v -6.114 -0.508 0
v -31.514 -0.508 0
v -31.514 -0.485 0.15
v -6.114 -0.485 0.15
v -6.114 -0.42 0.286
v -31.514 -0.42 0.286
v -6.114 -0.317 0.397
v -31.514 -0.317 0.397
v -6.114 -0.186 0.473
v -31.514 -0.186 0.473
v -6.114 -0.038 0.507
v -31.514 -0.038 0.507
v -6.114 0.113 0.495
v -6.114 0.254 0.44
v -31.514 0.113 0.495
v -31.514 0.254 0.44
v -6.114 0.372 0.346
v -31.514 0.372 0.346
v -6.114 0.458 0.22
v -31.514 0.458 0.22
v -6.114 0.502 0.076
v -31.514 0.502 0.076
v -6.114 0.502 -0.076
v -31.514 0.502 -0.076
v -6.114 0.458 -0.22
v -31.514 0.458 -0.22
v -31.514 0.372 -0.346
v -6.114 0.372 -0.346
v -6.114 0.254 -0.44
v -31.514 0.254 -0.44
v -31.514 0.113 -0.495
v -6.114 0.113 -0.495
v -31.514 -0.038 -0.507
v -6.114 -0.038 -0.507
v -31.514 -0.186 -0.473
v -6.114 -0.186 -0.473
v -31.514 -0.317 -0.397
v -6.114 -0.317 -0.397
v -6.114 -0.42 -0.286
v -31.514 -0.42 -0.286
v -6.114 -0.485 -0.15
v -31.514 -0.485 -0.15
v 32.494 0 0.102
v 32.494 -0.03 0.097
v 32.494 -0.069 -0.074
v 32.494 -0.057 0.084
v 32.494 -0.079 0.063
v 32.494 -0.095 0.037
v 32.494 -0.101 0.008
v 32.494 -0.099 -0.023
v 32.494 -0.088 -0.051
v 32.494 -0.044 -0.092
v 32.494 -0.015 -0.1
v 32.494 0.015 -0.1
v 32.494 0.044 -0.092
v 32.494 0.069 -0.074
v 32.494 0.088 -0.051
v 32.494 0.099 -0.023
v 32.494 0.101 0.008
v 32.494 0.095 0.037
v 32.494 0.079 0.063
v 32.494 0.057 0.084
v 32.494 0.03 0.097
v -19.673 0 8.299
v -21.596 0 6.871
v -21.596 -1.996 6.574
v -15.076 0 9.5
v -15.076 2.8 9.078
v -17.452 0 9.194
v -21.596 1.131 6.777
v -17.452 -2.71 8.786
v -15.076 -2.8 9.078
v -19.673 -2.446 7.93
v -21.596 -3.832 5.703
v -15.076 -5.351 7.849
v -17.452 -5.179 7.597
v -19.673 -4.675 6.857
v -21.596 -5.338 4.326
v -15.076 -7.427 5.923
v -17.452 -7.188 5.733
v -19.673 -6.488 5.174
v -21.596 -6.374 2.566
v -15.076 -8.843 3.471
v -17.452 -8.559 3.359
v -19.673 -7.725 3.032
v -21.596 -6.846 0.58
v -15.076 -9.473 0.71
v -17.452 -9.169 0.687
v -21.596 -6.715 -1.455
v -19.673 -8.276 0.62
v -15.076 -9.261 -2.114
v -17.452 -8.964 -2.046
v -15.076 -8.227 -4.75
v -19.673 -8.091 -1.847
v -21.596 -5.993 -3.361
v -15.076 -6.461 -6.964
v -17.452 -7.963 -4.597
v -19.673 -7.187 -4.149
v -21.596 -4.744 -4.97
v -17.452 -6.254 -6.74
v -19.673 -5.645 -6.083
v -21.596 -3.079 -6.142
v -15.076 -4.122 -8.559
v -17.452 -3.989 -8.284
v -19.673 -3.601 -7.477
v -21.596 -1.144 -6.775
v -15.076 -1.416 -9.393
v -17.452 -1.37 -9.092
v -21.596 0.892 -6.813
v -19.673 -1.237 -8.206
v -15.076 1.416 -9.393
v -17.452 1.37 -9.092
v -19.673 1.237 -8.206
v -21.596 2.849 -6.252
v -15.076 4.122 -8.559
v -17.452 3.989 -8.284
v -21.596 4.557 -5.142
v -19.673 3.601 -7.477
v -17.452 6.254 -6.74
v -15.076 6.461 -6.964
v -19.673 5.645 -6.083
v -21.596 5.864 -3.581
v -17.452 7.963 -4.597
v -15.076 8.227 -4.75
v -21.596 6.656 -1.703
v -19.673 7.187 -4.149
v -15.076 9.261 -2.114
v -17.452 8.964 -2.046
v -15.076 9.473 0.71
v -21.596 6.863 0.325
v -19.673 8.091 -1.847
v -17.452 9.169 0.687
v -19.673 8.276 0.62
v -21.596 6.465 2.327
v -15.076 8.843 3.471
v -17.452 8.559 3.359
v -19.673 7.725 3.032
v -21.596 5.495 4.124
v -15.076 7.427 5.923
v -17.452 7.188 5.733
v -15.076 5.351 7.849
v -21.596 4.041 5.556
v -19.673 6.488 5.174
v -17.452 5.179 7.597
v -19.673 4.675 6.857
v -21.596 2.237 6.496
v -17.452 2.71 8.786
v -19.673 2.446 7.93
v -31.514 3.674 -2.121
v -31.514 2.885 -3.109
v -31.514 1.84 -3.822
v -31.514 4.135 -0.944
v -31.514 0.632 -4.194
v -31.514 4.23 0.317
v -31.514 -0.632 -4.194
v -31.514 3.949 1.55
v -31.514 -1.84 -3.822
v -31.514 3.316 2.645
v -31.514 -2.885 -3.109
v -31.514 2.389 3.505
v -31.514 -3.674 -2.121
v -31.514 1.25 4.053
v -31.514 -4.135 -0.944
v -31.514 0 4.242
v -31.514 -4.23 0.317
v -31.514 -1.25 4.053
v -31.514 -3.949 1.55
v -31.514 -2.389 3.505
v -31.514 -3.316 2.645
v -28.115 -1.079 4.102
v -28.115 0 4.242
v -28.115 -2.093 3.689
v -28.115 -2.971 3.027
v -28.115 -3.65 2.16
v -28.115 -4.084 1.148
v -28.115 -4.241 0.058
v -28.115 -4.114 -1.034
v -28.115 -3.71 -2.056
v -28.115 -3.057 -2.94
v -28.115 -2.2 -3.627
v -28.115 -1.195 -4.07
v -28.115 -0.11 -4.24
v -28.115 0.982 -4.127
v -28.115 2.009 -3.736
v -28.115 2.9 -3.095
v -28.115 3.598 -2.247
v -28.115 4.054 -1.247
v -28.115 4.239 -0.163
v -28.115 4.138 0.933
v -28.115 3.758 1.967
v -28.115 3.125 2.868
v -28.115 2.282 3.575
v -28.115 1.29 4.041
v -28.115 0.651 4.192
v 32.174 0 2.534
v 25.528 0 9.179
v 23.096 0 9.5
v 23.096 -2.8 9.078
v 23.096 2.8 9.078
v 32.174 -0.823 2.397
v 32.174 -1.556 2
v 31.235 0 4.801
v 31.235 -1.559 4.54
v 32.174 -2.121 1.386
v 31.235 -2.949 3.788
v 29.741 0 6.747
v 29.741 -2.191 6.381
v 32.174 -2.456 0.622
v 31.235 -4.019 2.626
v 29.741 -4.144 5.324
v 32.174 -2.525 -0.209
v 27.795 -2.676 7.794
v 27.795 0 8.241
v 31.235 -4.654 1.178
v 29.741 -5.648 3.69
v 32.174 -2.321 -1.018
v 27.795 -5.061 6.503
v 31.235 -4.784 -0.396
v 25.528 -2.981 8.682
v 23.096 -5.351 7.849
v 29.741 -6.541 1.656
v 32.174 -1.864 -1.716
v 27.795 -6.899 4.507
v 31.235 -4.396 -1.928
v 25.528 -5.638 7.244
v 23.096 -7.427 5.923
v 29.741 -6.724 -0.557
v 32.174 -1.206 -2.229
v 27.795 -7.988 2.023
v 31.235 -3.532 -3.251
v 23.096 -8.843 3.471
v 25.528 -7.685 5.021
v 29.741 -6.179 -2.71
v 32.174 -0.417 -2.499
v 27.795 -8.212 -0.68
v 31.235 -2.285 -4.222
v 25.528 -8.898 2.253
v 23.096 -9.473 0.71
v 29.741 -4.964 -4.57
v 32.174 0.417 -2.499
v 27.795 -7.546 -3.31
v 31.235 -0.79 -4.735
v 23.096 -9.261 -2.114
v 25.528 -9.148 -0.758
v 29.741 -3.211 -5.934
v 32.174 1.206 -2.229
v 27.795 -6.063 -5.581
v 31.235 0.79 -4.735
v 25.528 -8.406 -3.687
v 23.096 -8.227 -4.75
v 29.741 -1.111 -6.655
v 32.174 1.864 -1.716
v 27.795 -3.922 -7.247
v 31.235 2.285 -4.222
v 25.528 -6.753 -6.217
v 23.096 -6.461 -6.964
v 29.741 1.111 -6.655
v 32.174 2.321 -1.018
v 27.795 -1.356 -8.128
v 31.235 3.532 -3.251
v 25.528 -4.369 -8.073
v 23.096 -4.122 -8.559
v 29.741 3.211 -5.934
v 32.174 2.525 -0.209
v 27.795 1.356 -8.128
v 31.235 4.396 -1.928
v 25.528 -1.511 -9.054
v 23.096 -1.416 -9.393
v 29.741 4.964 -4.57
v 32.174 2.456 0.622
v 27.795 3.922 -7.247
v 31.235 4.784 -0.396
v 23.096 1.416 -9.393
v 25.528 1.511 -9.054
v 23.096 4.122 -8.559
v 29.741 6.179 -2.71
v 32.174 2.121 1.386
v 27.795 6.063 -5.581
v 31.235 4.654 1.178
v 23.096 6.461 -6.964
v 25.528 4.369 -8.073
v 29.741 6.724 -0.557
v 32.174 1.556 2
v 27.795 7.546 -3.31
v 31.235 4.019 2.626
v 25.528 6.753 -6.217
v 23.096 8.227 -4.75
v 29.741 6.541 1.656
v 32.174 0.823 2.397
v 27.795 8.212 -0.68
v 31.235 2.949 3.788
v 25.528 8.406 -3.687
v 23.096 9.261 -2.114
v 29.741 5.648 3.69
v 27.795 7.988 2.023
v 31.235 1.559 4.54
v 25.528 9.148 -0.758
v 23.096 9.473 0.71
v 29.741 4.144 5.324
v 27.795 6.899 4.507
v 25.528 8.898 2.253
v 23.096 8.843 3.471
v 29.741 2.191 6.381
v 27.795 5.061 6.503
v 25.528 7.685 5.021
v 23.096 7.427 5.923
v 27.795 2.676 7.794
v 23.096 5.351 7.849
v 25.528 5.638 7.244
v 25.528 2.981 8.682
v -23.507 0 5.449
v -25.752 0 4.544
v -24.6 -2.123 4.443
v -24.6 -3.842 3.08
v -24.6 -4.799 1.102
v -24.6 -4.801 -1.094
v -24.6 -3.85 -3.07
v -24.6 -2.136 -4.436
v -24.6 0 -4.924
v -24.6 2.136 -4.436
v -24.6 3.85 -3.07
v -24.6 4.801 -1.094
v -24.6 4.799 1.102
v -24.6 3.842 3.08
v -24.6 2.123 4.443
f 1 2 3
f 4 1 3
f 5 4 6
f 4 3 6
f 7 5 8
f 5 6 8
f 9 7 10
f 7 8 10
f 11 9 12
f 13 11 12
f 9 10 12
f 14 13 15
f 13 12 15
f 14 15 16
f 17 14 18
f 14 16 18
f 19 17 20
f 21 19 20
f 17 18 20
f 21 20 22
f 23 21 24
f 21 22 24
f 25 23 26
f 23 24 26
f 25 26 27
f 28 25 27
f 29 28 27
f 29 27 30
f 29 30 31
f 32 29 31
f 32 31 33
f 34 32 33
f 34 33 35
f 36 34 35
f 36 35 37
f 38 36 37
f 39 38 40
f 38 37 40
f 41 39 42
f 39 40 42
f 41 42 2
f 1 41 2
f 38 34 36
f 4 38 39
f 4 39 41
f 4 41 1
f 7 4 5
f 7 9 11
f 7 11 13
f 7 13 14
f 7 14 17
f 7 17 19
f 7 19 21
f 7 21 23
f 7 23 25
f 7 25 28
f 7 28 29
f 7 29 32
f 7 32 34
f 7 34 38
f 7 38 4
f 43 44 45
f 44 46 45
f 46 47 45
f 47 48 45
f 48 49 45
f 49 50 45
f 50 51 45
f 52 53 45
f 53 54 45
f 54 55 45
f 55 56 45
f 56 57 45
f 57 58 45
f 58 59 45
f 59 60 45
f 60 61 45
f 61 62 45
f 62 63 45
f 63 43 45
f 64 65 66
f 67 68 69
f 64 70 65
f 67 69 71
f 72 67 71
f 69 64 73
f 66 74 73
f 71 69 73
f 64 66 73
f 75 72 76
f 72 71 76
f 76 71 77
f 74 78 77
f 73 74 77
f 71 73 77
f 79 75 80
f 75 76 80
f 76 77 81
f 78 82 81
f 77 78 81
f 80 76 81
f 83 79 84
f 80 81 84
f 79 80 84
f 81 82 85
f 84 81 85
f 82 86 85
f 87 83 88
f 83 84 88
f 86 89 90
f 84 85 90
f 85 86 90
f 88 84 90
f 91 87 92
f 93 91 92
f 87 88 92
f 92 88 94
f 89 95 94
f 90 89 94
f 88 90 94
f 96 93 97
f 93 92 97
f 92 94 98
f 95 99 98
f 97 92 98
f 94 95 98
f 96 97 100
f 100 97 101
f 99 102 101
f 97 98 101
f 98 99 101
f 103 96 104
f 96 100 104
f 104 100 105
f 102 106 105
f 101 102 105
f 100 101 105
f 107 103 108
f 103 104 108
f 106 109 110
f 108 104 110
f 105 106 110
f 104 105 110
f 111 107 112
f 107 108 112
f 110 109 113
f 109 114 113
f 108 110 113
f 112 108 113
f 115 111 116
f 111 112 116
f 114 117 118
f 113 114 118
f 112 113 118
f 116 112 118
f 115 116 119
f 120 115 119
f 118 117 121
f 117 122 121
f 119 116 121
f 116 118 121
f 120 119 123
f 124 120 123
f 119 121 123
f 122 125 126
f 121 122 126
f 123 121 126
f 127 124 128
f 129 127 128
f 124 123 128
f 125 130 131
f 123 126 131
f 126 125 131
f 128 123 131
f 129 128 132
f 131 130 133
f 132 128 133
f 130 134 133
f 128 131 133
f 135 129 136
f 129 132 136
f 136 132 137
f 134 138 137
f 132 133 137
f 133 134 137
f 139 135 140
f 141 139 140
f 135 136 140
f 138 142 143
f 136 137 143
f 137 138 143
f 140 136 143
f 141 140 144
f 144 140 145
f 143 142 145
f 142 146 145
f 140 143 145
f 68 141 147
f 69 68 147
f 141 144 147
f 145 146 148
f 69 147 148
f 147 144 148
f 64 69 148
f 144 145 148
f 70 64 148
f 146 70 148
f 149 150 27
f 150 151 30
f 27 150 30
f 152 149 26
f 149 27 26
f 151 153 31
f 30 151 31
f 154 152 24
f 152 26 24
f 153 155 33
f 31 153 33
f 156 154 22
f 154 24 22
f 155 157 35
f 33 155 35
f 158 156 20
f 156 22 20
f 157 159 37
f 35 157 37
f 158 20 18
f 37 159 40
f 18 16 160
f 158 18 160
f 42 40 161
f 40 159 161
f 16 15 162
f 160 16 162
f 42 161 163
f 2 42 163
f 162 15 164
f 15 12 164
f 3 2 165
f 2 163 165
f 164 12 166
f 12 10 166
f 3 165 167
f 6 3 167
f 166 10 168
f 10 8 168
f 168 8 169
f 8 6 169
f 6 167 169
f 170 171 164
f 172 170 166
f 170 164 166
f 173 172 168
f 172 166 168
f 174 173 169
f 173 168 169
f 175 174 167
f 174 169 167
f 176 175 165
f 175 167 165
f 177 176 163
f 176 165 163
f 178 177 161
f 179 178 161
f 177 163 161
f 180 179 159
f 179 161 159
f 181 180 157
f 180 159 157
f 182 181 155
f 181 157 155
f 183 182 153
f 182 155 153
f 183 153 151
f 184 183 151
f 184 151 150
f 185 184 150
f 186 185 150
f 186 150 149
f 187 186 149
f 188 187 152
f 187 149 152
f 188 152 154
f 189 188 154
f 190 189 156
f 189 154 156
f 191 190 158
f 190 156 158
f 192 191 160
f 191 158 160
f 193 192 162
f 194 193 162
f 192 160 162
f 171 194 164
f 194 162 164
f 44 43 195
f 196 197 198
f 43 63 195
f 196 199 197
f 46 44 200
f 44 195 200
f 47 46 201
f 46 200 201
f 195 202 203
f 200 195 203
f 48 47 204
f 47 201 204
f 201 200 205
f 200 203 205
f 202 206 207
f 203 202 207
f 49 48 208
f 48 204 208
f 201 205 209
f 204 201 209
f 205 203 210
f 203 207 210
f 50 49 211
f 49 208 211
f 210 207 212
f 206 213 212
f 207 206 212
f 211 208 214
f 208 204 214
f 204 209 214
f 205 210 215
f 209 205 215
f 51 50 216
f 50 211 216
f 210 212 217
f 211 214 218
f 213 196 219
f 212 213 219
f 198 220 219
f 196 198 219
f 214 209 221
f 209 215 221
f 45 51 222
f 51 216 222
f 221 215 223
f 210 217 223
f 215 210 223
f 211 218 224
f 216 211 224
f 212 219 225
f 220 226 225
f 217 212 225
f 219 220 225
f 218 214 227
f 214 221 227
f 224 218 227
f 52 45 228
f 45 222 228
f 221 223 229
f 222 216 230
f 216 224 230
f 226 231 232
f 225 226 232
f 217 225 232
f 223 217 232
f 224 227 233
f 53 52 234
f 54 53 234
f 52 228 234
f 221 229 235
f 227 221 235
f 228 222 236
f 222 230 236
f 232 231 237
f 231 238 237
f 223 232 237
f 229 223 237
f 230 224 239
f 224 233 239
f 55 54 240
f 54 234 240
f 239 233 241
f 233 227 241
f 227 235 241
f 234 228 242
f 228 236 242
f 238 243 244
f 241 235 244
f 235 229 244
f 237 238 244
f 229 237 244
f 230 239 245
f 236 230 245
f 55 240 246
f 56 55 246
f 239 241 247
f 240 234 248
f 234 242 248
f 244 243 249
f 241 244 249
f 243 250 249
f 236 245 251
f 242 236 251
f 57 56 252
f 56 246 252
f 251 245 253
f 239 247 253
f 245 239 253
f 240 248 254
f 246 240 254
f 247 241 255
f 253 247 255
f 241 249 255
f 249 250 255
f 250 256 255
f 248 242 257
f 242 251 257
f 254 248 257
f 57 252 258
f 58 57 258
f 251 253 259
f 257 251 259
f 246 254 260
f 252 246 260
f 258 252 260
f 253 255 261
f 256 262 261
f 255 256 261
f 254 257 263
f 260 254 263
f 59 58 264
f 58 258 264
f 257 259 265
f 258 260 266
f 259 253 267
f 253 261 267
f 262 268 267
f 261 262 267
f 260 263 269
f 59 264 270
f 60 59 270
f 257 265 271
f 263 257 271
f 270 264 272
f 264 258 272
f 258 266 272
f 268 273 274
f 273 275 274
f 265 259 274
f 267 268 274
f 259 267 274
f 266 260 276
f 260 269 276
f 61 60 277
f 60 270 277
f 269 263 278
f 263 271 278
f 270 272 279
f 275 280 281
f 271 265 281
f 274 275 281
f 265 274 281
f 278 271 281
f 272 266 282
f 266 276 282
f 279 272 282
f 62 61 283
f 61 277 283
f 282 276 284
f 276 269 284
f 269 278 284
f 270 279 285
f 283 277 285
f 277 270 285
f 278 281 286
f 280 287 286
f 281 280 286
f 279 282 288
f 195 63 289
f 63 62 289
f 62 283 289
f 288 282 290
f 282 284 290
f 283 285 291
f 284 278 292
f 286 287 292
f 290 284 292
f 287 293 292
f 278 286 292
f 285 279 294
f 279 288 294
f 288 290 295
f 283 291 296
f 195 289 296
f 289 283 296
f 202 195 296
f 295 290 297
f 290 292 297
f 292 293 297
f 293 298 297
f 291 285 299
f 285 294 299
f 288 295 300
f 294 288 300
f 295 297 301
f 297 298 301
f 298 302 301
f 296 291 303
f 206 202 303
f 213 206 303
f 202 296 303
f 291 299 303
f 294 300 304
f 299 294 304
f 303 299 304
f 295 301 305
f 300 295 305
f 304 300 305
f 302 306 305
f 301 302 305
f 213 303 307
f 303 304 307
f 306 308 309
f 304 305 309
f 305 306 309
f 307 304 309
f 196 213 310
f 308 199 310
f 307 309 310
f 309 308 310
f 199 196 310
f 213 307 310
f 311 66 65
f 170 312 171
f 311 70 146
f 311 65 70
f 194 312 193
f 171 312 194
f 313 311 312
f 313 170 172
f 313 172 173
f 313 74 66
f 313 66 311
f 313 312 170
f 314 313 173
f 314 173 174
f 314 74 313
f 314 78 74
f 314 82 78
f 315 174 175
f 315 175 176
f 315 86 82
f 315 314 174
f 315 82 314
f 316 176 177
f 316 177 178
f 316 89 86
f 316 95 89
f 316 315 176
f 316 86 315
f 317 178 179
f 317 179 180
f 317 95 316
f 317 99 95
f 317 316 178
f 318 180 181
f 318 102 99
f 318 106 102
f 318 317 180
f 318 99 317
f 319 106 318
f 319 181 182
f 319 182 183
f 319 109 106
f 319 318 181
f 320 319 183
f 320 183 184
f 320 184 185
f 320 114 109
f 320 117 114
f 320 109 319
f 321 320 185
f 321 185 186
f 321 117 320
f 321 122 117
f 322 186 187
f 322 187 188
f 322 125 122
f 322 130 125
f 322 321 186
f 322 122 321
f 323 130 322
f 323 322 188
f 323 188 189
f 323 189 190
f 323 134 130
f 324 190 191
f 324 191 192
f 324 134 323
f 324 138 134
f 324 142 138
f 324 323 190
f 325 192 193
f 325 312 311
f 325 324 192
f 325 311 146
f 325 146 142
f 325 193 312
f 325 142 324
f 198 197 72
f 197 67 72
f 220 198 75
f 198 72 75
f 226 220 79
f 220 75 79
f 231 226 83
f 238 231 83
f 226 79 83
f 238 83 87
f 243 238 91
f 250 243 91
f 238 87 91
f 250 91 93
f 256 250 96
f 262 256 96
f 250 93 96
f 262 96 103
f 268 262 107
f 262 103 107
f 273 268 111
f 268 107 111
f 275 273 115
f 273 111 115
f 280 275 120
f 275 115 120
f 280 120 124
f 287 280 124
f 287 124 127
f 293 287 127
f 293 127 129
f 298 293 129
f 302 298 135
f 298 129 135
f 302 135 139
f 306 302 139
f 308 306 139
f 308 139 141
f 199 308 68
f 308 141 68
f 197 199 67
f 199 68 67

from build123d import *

# Parameters (mm, degrees)
F2_R     = 9.398
F4_R     = 9.398
F5_R     = 0.508
F6_DEPTH = 25.4


# Not quite as in the source:
# - a fillet or chamfer that OpenCascade refuses, or shapes differently, is made with other operations: its cross-section is extruded or revolved along the edge and cut away or added


with BuildPart() as f1:
    # F0 (on Front) → F1 (revolve)
    with BuildSketch(Plane.XZ):
        Polygon((-31.5141436086, 0), (0, 0), (32.4938563914, 0), (32.4938563914, 9.4996), (-23.5131436086, 9.4996), (-23.5131436086, 4.2418), (-31.5141436086, 4.2418), align=None)
    revolve(axis=Axis((16.2469281957, 0, 0), (1, 0, 0)))

    # F2
    f2_edges = [f1.edges().sort_by_distance(p)[0] for p in [
        (32.493856, 0, -9.4996),
    ]]
    fillet(f2_edges, radius=F2_R)

    # F3: fillet of radius 9.398 on 1 edges, made by hand

    # F3_s1 → F3_t2 (revolve, cut)
    with BuildSketch(Plane.XZ):
        with BuildLine():
            ThreePointArc((-15.0762515291, 9.4996), (-20.0468050396, 8.0775640044), (-23.5131436086, 4.2418))
            Line((-23.5131436086, 4.2418), (-23.5131436086, 9.4996))
            Line((-23.5131436086, 9.4996), (-15.0762515291, 9.4996))
        make_face()
    revolve(axis=Axis((-23.5131436086, 0, 0), (1, 0, 0)), mode=Mode.SUBTRACT)

    # F4
    f4_edges = [f1.edges().sort_by_distance(p)[0] for p in [
        (-23.513144, 0, -4.2418),
    ]]
    fillet(f4_edges, radius=F4_R)

    # F5 (on face) → F6 (cut)
    with BuildSketch(Plane(origin=(-31.5141436086, 0, 0), x_dir=(0, -1, 0), z_dir=(-1, 0, 0))):
        Circle(F5_R)
    extrude(amount=-F6_DEPTH, mode=Mode.SUBTRACT)


solid = f1.part
